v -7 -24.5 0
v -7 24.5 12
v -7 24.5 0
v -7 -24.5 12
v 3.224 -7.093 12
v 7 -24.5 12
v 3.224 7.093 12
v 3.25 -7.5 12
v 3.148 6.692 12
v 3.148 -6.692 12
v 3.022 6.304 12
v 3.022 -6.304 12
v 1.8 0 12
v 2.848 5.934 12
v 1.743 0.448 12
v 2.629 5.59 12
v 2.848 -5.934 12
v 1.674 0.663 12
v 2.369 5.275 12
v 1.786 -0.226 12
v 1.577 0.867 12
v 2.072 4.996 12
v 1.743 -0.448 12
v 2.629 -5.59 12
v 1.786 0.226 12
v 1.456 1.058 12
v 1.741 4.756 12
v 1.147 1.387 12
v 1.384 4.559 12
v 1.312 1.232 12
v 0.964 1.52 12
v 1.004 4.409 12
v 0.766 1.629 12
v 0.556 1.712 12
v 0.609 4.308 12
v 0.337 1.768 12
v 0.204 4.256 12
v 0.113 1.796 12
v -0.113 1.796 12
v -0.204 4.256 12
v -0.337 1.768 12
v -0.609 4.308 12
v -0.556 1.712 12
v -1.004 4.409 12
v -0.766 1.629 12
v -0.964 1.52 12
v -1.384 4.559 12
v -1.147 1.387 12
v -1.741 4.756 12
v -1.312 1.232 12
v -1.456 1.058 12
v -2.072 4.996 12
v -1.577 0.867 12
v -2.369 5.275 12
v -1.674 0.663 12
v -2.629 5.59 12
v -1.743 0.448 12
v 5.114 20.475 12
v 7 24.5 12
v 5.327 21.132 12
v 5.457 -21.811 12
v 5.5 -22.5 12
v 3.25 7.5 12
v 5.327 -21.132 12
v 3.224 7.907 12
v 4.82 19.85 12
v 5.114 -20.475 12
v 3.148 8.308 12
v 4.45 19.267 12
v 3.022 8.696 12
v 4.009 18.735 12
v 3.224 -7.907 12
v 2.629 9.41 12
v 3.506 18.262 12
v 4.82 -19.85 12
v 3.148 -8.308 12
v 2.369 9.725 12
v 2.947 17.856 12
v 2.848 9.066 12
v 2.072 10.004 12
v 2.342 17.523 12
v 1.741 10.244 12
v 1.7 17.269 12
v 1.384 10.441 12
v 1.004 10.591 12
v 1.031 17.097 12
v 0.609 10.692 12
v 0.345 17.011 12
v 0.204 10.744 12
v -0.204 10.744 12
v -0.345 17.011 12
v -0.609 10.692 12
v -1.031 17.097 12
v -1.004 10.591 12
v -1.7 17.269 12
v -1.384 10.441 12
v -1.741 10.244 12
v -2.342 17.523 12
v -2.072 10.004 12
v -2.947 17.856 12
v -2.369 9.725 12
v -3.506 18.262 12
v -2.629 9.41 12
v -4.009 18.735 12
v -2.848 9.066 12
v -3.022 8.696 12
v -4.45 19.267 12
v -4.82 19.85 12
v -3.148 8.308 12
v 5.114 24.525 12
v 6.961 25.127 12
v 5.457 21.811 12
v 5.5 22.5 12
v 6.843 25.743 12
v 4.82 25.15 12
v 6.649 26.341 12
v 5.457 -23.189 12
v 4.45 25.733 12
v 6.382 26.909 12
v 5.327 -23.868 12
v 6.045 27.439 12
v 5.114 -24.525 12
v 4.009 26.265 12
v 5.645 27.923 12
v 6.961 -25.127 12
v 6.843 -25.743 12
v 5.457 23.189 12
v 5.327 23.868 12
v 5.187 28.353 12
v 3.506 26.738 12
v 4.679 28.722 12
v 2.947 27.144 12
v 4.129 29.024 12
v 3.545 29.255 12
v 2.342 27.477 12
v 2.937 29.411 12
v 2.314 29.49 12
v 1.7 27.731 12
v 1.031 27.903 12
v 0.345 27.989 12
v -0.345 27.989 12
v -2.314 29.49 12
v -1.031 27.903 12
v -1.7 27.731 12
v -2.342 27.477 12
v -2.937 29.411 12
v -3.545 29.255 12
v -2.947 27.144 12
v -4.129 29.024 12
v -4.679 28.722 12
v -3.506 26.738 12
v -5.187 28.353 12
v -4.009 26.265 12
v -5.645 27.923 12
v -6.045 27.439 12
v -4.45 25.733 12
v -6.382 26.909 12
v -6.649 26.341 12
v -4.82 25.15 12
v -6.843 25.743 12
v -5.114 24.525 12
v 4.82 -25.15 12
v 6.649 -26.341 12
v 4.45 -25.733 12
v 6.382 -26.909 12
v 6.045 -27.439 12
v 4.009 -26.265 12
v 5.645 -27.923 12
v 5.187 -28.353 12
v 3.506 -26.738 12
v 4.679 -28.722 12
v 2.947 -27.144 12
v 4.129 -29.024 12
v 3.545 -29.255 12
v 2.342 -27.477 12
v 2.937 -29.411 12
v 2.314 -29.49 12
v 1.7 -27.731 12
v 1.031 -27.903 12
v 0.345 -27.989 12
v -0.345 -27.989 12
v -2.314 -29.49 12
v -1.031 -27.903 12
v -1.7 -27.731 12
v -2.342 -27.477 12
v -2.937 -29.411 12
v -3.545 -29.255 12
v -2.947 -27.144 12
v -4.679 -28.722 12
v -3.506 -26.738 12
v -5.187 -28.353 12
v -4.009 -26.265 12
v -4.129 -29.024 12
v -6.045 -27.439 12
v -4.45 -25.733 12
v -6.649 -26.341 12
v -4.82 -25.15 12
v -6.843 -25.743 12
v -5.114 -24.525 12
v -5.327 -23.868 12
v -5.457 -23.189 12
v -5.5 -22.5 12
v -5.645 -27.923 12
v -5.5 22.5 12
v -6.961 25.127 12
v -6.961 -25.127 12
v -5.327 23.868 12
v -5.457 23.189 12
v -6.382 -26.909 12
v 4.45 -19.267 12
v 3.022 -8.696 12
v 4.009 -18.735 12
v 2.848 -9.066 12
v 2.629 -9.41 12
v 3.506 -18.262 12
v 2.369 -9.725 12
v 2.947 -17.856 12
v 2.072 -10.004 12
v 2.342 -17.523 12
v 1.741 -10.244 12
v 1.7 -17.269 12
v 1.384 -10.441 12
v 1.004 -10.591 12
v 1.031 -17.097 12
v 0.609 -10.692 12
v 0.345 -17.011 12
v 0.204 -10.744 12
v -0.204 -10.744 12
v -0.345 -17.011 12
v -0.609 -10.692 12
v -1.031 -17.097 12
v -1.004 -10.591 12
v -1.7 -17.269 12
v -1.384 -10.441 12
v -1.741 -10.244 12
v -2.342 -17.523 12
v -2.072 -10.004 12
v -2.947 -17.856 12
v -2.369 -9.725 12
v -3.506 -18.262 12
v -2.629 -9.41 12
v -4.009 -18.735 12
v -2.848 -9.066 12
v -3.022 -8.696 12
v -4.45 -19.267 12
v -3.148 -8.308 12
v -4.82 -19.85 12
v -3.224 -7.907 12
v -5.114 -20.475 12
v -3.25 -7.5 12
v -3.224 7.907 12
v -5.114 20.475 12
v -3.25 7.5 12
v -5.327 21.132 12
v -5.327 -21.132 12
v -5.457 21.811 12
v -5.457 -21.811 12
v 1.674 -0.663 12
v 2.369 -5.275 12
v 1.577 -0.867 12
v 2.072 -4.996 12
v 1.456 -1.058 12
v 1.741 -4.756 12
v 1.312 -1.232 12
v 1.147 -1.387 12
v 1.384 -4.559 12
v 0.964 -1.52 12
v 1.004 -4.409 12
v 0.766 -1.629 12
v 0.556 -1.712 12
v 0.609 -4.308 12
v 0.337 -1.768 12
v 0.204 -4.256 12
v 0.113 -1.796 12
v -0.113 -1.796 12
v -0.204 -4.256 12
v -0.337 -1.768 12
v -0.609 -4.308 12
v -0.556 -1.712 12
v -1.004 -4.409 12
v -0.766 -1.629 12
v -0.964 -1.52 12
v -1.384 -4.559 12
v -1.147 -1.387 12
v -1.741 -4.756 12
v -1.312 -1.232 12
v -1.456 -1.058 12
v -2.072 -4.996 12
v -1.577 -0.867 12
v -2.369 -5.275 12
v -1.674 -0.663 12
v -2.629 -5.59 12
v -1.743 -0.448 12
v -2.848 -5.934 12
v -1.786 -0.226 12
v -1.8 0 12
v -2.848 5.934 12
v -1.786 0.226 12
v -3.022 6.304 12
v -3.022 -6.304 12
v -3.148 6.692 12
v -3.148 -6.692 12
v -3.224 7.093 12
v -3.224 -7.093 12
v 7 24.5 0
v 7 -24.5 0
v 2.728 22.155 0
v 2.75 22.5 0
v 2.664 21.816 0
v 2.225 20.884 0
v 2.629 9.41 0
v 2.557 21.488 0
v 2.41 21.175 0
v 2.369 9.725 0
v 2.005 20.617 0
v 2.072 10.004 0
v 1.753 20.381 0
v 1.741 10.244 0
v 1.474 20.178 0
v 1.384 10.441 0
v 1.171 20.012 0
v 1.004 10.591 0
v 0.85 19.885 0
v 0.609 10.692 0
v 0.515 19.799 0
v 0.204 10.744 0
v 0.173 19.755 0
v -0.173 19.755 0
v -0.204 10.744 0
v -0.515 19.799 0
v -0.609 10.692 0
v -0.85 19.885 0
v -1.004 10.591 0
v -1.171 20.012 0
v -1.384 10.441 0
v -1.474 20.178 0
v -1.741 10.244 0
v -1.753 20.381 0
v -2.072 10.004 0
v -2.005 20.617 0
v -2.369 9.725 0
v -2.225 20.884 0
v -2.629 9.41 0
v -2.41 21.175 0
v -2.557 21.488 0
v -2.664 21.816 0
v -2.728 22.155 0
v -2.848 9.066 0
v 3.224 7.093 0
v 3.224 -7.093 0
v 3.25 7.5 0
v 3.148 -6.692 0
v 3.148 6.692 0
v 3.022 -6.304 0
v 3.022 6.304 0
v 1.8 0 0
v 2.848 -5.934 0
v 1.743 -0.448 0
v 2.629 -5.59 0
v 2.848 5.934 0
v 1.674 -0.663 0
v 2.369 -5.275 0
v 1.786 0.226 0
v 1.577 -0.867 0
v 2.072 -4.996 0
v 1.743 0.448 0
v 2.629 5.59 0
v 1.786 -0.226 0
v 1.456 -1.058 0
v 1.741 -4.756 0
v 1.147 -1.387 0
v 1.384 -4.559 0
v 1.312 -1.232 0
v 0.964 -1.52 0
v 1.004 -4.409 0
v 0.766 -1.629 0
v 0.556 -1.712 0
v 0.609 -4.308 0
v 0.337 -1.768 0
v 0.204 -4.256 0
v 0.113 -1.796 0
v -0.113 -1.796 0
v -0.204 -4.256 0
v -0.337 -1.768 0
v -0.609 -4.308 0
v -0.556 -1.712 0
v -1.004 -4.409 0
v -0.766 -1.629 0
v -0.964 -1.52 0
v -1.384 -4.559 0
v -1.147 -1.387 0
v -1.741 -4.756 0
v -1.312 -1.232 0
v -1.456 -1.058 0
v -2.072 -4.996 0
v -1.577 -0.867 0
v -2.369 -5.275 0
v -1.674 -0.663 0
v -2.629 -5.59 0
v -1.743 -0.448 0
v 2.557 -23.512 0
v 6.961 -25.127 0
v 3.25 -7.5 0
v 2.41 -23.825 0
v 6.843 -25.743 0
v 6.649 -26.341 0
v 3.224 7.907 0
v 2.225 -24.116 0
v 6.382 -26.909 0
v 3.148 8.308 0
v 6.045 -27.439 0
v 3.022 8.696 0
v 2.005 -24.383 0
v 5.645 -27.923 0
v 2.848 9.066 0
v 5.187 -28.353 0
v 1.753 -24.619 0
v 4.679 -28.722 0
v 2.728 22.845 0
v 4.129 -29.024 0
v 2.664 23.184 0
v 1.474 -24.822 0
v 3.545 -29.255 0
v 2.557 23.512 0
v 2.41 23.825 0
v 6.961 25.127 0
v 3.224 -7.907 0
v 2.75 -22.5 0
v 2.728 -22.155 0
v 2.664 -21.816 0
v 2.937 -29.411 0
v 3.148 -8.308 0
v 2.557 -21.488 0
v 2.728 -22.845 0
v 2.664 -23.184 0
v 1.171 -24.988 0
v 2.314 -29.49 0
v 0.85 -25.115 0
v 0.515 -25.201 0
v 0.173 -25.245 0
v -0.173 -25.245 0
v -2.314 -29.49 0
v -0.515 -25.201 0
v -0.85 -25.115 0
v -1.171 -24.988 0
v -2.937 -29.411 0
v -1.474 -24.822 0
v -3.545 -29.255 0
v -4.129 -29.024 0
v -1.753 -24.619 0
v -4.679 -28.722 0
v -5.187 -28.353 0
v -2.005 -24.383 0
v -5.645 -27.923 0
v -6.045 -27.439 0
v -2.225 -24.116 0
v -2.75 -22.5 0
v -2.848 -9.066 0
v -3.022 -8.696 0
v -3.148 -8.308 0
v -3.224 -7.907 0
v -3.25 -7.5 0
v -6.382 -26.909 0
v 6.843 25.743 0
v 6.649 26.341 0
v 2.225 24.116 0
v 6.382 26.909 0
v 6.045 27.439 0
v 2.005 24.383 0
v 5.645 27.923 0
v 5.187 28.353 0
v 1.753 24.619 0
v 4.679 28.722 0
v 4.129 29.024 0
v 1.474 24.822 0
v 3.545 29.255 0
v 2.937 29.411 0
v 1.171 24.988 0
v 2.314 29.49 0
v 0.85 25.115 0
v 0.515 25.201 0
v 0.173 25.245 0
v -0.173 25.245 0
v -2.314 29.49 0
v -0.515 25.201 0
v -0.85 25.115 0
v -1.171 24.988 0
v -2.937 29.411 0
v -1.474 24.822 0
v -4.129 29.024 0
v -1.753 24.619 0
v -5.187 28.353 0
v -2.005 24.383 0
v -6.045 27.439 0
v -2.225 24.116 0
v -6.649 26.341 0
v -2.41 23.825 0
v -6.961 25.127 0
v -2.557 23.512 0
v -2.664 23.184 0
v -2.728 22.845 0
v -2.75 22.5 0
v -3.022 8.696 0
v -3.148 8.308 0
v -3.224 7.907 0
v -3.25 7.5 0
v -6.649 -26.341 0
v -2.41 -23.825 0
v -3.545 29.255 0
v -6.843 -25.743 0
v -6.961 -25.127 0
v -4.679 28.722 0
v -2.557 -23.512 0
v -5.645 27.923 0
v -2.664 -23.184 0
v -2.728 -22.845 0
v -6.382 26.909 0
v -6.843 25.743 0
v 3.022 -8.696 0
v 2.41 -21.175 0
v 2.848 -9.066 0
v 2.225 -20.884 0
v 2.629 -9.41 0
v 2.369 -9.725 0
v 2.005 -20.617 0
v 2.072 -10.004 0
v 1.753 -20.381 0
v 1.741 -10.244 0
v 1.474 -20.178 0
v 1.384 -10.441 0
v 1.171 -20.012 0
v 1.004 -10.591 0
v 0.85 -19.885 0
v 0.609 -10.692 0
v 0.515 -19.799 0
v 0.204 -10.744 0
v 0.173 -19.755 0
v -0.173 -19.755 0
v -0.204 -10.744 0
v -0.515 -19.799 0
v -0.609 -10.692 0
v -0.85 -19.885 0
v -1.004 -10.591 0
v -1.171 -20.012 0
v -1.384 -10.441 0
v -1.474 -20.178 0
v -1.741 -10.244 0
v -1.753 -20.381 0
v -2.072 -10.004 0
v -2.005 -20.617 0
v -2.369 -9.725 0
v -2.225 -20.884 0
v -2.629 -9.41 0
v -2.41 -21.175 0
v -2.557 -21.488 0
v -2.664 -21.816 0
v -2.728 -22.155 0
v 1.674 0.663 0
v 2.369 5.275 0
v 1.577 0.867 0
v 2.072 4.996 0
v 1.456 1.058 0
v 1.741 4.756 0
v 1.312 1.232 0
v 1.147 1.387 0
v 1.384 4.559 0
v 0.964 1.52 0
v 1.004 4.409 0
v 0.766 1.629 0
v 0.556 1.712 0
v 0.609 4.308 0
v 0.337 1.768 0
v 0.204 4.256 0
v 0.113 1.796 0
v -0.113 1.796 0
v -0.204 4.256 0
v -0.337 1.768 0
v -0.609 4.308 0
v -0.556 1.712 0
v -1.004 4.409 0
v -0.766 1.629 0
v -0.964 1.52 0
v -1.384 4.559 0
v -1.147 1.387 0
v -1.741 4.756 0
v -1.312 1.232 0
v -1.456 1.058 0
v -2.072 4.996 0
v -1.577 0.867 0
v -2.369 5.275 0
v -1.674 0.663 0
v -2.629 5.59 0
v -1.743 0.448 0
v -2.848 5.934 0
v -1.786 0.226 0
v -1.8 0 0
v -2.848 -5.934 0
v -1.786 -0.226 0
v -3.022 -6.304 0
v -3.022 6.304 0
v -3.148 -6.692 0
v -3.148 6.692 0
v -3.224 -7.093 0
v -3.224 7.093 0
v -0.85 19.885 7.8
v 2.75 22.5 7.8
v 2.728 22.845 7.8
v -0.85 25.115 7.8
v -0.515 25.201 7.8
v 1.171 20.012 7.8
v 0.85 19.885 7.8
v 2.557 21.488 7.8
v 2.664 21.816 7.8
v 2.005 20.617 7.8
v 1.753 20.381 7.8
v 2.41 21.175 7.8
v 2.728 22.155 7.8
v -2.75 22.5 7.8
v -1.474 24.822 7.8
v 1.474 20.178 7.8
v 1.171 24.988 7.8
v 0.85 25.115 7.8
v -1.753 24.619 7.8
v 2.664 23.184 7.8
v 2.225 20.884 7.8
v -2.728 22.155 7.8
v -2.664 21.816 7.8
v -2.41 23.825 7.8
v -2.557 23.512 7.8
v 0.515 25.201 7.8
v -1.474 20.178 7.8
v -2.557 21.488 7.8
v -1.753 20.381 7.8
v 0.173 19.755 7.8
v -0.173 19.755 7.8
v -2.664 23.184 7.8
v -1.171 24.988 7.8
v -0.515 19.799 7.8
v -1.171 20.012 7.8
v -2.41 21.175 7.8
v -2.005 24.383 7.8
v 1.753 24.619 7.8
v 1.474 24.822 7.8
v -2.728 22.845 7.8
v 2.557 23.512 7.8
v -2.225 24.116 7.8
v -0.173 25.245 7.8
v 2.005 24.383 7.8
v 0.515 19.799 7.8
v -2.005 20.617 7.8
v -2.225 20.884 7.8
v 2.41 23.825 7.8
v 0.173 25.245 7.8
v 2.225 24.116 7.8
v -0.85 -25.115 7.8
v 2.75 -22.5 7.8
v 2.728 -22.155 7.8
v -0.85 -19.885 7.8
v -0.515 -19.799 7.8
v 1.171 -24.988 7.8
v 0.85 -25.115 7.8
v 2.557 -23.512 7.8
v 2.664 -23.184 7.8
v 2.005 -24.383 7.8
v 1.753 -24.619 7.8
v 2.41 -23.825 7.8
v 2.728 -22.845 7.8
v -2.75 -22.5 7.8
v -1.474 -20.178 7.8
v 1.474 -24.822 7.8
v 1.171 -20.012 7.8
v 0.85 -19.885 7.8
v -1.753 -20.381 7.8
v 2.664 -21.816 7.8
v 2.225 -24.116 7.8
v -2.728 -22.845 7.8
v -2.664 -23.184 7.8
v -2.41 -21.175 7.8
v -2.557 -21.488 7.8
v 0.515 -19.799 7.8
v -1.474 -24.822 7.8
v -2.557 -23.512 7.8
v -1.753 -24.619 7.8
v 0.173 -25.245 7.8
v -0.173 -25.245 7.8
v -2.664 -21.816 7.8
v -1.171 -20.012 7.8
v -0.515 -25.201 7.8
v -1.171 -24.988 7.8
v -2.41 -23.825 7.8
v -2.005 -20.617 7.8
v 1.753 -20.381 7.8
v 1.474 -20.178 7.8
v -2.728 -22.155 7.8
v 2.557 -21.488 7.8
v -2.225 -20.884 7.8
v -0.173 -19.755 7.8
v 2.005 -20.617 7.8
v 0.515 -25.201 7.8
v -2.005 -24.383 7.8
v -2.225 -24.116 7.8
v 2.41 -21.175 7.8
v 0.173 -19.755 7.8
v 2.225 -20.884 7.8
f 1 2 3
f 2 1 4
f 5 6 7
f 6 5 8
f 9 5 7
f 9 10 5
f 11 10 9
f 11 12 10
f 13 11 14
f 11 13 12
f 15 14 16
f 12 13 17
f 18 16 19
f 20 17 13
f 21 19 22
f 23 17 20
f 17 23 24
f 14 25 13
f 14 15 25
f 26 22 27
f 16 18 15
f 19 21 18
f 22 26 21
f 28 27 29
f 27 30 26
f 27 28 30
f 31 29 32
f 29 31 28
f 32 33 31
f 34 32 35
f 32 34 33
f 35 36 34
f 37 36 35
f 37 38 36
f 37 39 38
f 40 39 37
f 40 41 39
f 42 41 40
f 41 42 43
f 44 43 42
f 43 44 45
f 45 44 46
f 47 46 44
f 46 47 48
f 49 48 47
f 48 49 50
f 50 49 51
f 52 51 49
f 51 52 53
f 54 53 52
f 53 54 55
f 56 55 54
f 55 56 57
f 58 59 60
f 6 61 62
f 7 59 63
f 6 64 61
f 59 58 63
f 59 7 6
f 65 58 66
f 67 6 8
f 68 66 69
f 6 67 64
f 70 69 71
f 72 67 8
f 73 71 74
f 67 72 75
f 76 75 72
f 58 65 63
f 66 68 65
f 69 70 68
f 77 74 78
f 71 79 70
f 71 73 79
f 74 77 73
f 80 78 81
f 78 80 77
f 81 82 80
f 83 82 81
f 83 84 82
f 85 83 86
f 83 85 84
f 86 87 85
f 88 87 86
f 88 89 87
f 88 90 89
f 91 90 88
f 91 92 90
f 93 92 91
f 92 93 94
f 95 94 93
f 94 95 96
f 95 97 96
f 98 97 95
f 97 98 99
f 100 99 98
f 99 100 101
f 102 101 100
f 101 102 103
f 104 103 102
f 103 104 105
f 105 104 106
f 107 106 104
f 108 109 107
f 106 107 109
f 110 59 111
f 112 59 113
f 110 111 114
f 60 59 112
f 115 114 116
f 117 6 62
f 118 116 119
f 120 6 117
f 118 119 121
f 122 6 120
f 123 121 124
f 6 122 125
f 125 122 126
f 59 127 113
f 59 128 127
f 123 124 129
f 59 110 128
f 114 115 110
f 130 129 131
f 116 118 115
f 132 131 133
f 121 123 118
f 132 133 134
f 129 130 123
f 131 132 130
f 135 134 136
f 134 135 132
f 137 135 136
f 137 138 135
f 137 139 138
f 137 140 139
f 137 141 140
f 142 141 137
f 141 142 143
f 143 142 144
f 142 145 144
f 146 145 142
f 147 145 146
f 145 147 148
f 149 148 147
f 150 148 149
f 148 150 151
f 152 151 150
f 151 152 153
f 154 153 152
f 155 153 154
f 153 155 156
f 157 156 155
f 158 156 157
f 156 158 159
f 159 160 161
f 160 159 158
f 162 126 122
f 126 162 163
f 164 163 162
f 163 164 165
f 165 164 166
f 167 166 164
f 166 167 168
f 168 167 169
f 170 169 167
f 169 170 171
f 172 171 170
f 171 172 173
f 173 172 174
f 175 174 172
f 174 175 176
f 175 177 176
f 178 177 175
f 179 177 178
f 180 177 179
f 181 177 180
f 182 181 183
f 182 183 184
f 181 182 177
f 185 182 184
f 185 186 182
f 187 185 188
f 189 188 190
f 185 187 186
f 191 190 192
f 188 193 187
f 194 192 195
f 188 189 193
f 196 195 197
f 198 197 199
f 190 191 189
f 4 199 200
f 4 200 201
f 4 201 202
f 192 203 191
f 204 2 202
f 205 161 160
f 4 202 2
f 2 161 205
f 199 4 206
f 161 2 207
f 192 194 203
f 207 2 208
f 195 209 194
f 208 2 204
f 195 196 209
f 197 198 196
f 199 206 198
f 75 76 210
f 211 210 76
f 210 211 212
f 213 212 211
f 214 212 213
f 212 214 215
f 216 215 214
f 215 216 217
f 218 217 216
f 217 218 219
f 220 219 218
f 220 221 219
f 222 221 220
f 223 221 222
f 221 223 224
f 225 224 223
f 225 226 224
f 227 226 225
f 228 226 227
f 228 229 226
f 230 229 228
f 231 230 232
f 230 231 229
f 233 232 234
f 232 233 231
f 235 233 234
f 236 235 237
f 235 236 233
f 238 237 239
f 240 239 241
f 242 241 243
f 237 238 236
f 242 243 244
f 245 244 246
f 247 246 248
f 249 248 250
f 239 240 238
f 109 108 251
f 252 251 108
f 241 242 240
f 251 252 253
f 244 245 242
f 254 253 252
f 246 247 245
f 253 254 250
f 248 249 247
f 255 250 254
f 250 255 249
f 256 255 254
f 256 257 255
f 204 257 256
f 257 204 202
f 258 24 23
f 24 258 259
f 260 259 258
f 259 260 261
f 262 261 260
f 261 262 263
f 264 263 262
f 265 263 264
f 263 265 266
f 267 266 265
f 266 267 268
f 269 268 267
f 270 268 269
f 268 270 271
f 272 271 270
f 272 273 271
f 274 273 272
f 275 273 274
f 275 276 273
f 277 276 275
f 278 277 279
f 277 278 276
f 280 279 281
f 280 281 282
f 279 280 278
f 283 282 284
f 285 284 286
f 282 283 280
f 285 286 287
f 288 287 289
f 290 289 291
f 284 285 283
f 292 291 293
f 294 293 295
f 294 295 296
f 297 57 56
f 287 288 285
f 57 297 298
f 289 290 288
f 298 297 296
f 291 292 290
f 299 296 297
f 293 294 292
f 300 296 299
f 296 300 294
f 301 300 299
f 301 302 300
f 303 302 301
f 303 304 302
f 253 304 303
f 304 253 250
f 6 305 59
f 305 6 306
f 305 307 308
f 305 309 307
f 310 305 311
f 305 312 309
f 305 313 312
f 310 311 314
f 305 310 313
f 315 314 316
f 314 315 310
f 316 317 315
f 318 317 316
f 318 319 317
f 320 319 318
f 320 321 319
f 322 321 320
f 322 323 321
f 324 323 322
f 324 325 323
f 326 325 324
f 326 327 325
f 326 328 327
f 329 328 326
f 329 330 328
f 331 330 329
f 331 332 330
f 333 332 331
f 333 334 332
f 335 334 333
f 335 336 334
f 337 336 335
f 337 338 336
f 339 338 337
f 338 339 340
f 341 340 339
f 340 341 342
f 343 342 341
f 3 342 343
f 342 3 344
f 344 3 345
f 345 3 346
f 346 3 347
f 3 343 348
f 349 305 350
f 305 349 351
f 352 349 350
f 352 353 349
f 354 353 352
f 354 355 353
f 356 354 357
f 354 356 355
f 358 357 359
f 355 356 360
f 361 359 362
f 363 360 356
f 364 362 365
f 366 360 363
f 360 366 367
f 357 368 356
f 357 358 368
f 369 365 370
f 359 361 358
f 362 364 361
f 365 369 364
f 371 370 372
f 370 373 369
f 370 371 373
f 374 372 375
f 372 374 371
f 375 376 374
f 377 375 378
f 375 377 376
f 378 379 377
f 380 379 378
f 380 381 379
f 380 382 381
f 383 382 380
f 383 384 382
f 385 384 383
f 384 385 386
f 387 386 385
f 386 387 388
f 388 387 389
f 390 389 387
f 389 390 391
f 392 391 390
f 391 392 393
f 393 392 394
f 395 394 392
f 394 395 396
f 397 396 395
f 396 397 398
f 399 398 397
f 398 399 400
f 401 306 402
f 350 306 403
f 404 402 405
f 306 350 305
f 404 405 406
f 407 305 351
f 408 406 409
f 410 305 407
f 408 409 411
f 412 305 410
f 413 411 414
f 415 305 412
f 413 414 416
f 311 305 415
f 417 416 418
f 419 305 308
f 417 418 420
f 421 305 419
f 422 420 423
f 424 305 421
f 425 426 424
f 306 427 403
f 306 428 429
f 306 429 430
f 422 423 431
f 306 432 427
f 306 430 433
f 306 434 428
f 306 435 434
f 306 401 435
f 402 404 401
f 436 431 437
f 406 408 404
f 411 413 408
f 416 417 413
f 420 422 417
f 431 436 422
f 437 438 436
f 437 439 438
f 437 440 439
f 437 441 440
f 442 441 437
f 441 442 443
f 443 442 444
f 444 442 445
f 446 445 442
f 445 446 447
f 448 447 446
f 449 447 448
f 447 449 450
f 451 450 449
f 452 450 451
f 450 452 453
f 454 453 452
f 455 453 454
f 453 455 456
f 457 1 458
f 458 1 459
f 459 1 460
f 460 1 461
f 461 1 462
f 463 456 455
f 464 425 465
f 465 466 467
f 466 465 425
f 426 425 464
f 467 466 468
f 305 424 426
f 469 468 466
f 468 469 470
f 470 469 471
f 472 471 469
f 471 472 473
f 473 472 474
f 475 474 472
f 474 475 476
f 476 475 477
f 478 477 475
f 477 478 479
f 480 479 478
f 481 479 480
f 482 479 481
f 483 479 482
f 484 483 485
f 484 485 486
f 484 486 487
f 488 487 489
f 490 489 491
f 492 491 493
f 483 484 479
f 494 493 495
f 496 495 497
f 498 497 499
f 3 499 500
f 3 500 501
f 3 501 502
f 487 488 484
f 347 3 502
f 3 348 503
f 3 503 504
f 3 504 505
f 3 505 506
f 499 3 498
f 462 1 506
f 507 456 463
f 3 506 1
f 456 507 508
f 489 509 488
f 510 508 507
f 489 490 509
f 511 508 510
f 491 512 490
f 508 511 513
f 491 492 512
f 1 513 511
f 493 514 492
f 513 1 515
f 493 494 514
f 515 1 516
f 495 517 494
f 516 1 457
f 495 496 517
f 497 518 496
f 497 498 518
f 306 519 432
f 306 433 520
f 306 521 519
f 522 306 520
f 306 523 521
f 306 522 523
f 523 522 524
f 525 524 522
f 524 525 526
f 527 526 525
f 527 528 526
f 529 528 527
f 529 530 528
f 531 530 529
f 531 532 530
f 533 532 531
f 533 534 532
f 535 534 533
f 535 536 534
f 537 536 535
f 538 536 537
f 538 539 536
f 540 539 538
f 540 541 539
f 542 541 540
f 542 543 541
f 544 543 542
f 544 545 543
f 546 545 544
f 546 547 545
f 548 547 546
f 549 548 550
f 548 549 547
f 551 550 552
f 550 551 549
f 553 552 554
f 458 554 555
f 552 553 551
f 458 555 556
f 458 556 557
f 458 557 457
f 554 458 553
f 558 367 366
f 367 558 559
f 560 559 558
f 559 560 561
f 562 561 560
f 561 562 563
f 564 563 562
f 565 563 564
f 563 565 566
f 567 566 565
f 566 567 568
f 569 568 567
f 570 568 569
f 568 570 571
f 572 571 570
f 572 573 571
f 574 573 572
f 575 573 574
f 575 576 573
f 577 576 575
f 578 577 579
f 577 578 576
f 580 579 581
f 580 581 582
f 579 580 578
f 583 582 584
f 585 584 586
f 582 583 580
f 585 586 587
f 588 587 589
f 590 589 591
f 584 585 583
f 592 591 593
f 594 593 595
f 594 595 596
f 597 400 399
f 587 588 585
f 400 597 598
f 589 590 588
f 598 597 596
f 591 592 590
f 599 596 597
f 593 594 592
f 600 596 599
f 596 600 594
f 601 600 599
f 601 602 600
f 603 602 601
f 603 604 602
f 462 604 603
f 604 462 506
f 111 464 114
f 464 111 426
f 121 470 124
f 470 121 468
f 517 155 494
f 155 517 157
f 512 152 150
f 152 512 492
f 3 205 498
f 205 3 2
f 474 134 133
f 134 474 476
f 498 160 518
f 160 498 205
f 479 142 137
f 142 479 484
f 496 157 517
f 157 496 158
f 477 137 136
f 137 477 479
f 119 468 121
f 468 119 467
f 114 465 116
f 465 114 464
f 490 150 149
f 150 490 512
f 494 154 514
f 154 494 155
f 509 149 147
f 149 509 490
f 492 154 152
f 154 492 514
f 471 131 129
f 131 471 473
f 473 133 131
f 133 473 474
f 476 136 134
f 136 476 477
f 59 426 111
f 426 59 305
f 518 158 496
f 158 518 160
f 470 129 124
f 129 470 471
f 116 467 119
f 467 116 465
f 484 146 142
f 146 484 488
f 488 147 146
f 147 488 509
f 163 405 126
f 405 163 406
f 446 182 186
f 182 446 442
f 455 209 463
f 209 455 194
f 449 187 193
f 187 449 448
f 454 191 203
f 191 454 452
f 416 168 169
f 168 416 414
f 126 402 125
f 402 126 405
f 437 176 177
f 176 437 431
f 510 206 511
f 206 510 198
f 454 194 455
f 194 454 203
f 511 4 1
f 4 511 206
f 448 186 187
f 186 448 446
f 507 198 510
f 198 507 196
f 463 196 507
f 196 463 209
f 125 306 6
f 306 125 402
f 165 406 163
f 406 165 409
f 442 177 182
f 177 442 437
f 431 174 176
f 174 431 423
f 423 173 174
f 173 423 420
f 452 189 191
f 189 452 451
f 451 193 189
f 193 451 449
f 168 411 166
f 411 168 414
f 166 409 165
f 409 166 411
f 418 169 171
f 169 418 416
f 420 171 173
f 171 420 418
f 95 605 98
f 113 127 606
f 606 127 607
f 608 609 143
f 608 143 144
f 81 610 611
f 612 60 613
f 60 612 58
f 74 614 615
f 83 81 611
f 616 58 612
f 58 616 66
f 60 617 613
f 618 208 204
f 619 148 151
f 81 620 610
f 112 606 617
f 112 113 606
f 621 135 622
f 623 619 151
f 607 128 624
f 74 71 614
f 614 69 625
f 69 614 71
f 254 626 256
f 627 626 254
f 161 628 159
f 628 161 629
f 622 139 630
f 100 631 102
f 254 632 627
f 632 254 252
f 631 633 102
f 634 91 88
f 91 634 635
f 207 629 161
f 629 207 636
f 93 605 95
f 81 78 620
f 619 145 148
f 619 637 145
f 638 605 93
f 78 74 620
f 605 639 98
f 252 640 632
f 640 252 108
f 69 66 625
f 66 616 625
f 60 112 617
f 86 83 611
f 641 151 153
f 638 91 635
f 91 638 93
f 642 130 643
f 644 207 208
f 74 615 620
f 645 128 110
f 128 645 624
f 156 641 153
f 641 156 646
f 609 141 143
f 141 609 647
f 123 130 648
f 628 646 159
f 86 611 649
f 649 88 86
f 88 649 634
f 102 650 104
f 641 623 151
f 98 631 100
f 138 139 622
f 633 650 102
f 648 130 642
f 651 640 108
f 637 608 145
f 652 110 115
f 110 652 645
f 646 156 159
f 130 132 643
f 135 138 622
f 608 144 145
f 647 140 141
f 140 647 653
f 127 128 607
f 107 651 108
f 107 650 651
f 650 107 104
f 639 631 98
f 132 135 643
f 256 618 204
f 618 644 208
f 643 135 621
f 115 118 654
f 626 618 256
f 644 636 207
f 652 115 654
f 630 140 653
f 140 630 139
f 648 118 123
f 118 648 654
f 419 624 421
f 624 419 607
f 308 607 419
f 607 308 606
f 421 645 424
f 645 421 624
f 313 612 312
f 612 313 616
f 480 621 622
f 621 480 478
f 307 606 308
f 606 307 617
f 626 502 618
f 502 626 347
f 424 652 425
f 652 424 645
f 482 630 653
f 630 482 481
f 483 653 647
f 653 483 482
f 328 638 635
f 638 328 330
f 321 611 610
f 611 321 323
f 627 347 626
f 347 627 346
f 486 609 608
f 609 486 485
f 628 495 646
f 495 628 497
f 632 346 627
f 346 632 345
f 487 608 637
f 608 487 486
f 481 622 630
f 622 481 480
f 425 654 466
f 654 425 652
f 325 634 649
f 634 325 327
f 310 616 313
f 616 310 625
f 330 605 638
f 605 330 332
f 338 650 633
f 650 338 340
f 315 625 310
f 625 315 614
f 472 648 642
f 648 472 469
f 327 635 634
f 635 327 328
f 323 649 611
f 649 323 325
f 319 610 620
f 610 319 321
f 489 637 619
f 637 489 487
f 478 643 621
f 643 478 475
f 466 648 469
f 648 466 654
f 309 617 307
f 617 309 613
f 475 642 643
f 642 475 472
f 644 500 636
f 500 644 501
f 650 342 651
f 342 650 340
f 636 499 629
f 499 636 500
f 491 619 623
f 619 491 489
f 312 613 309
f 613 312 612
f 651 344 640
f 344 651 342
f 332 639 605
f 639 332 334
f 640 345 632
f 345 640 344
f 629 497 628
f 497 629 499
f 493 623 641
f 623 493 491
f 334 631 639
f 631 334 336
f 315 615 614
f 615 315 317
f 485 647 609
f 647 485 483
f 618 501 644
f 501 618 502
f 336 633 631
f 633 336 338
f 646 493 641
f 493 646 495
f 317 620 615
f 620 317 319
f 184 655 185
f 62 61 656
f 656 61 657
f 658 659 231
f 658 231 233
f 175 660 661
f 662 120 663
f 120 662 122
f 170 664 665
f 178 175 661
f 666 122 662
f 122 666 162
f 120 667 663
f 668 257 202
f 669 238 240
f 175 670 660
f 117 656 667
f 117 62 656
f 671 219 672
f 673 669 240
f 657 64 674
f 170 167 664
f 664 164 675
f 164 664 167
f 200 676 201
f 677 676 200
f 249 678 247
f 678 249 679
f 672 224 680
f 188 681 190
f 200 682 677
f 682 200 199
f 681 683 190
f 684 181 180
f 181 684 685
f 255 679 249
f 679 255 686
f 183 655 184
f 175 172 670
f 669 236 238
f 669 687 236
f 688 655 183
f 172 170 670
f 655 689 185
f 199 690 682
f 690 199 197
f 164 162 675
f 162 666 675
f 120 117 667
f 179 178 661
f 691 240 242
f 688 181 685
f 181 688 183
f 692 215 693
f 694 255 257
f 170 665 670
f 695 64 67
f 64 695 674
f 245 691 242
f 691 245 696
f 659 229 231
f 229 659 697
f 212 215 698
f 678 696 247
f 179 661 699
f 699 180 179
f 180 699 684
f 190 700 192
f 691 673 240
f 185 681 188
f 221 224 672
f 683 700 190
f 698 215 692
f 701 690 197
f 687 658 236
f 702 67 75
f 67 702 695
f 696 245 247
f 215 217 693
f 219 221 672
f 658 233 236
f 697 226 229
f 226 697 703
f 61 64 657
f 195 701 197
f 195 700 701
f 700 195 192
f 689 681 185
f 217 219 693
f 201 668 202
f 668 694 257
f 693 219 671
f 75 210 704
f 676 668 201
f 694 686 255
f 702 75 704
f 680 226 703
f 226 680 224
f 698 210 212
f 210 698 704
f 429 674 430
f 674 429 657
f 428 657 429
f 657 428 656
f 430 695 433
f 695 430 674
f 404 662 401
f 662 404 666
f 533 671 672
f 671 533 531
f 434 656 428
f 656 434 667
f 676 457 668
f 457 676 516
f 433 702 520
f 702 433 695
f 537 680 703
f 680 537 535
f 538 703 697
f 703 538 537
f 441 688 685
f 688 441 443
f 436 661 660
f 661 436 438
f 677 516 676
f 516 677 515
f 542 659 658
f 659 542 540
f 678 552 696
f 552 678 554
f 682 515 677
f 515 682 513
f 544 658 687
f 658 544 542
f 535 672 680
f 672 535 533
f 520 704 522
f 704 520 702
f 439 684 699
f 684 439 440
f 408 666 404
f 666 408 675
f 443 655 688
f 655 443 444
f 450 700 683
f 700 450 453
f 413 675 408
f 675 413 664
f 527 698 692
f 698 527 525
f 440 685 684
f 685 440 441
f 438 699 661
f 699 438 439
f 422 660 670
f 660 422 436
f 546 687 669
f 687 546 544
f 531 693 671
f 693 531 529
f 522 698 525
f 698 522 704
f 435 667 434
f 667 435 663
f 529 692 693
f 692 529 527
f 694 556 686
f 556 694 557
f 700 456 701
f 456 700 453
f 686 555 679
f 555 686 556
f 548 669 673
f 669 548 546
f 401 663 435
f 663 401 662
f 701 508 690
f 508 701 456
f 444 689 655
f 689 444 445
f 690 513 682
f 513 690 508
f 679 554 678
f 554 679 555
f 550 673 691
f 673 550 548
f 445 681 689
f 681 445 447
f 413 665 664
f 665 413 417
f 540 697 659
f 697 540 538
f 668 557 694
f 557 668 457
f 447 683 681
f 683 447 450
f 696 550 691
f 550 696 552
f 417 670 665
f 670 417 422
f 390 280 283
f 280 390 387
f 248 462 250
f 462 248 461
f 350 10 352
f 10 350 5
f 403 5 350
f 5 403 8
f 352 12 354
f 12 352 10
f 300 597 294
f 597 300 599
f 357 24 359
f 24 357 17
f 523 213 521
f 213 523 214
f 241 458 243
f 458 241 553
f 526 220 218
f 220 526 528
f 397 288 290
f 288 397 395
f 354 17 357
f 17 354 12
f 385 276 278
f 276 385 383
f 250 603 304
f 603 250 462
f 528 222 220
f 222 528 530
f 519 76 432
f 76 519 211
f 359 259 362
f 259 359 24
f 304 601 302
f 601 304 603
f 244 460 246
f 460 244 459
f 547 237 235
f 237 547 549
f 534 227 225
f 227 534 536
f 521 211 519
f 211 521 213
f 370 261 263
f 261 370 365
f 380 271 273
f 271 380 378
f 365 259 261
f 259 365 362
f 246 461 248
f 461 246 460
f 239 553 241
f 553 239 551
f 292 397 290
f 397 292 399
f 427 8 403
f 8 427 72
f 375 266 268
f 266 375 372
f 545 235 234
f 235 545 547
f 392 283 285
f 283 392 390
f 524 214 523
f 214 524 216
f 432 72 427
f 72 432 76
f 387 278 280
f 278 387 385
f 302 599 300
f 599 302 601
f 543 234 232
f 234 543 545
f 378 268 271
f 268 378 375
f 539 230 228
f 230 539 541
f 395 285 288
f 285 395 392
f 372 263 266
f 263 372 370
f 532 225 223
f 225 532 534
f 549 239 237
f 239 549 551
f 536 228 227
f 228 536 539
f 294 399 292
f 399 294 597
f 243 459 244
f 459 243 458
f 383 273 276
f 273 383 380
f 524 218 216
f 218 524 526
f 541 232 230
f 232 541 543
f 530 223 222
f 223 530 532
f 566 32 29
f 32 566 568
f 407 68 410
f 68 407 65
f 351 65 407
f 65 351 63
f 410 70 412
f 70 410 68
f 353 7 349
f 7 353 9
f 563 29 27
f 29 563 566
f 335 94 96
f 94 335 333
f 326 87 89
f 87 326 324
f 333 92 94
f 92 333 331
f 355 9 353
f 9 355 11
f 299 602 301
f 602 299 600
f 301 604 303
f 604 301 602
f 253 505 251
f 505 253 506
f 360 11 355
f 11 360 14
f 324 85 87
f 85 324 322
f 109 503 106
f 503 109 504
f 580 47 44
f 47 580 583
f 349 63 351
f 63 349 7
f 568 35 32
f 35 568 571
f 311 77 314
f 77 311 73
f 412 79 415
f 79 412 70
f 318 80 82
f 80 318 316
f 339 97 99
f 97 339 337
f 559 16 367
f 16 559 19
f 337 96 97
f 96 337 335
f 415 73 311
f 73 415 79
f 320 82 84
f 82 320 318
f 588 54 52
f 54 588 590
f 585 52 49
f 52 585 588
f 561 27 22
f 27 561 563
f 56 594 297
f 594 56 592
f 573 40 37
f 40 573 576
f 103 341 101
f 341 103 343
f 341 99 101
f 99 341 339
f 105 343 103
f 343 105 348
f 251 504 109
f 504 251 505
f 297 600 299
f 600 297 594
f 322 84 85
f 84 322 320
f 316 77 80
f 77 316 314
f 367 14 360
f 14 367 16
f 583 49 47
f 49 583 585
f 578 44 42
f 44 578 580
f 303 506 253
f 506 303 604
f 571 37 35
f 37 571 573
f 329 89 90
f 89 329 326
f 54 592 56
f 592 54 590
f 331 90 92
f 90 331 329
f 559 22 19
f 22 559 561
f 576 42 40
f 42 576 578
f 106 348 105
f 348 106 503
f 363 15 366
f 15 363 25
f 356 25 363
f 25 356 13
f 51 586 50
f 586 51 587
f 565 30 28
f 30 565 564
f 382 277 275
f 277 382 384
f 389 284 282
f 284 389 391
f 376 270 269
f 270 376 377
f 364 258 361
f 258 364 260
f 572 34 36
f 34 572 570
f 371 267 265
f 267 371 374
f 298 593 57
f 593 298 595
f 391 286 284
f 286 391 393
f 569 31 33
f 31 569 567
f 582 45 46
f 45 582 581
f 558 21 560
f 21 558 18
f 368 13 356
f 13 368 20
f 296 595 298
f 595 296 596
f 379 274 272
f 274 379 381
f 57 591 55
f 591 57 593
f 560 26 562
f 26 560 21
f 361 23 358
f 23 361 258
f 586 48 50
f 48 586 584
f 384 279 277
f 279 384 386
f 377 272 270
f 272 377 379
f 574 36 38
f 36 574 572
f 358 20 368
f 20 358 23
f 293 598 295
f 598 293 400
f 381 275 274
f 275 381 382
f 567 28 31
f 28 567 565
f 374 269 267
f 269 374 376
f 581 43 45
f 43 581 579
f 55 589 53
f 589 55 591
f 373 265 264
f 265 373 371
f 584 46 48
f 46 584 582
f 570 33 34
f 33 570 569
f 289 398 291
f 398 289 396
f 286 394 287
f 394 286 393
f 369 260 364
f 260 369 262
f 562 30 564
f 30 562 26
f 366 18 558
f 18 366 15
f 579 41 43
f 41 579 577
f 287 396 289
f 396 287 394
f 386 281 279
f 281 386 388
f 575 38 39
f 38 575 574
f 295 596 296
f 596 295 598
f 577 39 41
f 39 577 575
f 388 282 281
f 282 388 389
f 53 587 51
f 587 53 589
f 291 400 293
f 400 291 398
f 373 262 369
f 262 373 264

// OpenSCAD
$fn = 50;


difference() {
	union() {
		hull() {
			translate(v = [-2.0000000000, 9.5000000000, 0]) {
				cylinder(h = 12, r = 5);
			}
			translate(v = [2.0000000000, 9.5000000000, 0]) {
				cylinder(h = 12, r = 5);
			}
			translate(v = [-2.0000000000, -9.5000000000, 0]) {
				cylinder(h = 12, r = 5);
			}
			translate(v = [2.0000000000, -9.5000000000, 0]) {
				cylinder(h = 12, r = 5);
			}
		}
		translate(v = [0.0000000000, 15.0000000000, 0]) {
			hull() {
				translate(v = [-2.0000000000, 9.5000000000, 0]) {
					cylinder(h = 12, r = 5);
				}
				translate(v = [2.0000000000, 9.5000000000, 0]) {
					cylinder(h = 12, r = 5);
				}
				translate(v = [-2.0000000000, -9.5000000000, 0]) {
					cylinder(h = 12, r = 5);
				}
				translate(v = [2.0000000000, -9.5000000000, 0]) {
					cylinder(h = 12, r = 5);
				}
			}
		}
		translate(v = [0.0000000000, 15.0000000000, 0]) {
			hull() {
				translate(v = [-2.0000000000, 9.5000000000, 0]) {
					cylinder(h = 12, r = 5);
				}
				translate(v = [2.0000000000, 9.5000000000, 0]) {
					cylinder(h = 12, r = 5);
				}
				translate(v = [-2.0000000000, -9.5000000000, 0]) {
					cylinder(h = 12, r = 5);
				}
				translate(v = [2.0000000000, -9.5000000000, 0]) {
					cylinder(h = 12, r = 5);
				}
			}
		}
		translate(v = [0.0000000000, -15.0000000000, 0]) {
			hull() {
				translate(v = [-2.0000000000, 9.5000000000, 0]) {
					cylinder(h = 12, r = 5);
				}
				translate(v = [2.0000000000, 9.5000000000, 0]) {
					cylinder(h = 12, r = 5);
				}
				translate(v = [-2.0000000000, -9.5000000000, 0]) {
					cylinder(h = 12, r = 5);
				}
				translate(v = [2.0000000000, -9.5000000000, 0]) {
					cylinder(h = 12, r = 5);
				}
			}
		}
		translate(v = [0.0000000000, -15.0000000000, 0]) {
			hull() {
				translate(v = [-2.0000000000, 9.5000000000, 0]) {
					cylinder(h = 12, r = 5);
				}
				translate(v = [2.0000000000, 9.5000000000, 0]) {
					cylinder(h = 12, r = 5);
				}
				translate(v = [-2.0000000000, -9.5000000000, 0]) {
					cylinder(h = 12, r = 5);
				}
				translate(v = [2.0000000000, -9.5000000000, 0]) {
					cylinder(h = 12, r = 5);
				}
			}
		}
	}
	union() {
		translate(v = [0.0000000000, 22.5000000000, 12]) {
			rotate(a = [0, 0, 0]) {
				difference() {
					union() {
						#translate(v = [0, 0, -12.0000000000]) {
							cylinder(h = 12, r = 2.2500000000);
						}
						#translate(v = [0, 0, -4.2000000000]) {
							cylinder(h = 4.2000000000, r1 = 2.7500000000, r2 = 5.5000000000);
						}
						#translate(v = [0, 0, -12.0000000000]) {
							cylinder(h = 12, r = 2.7500000000);
						}
						#translate(v = [0, 0, -12.0000000000]) {
							cylinder(h = 12, r = 2.2500000000);
						}
					}
					union();
				}
			}
		}
		translate(v = [0.0000000000, 22.5000000000, 12]) {
			rotate(a = [0, 0, 0]) {
				difference() {
					union() {
						#translate(v = [0, 0, -12.0000000000]) {
							cylinder(h = 12, r = 2.2500000000);
						}
						#translate(v = [0, 0, -4.2000000000]) {
							cylinder(h = 4.2000000000, r1 = 2.7500000000, r2 = 5.5000000000);
						}
						#translate(v = [0, 0, -12.0000000000]) {
							cylinder(h = 12, r = 2.7500000000);
						}
						#translate(v = [0, 0, -12.0000000000]) {
							cylinder(h = 12, r = 2.2500000000);
						}
					}
					union();
				}
			}
		}
		translate(v = [0.0000000000, -22.5000000000, 12]) {
			rotate(a = [0, 0, 0]) {
				difference() {
					union() {
						#translate(v = [0, 0, -12.0000000000]) {
							cylinder(h = 12, r = 2.2500000000);
						}
						#translate(v = [0, 0, -4.2000000000]) {
							cylinder(h = 4.2000000000, r1 = 2.7500000000, r2 = 5.5000000000);
						}
						#translate(v = [0, 0, -12.0000000000]) {
							cylinder(h = 12, r = 2.7500000000);
						}
						#translate(v = [0, 0, -12.0000000000]) {
							cylinder(h = 12, r = 2.2500000000);
						}
					}
					union();
				}
			}
		}
		translate(v = [0.0000000000, -22.5000000000, 12]) {
			rotate(a = [0, 0, 0]) {
				difference() {
					union() {
						#translate(v = [0, 0, -12.0000000000]) {
							cylinder(h = 12, r = 2.2500000000);
						}
						#translate(v = [0, 0, -4.2000000000]) {
							cylinder(h = 4.2000000000, r1 = 2.7500000000, r2 = 5.5000000000);
						}
						#translate(v = [0, 0, -12.0000000000]) {
							cylinder(h = 12, r = 2.7500000000);
						}
						#translate(v = [0, 0, -12.0000000000]) {
							cylinder(h = 12, r = 2.2500000000);
						}
					}
					union();
				}
			}
		}
		translate(v = [0.0000000000, -7.5000000000, 0]) {
			translate(v = [0, 0, -100]) {
				cylinder(h = 200, r = 3.2500000000);
			}
		}
		translate(v = [0.0000000000, 7.5000000000, 0]) {
			translate(v = [0, 0, -100]) {
				cylinder(h = 200, r = 3.2500000000);
			}
		}
		translate(v = [0.0000000000, -7.5000000000, 0]) {
			translate(v = [0, 0, -100]) {
				cylinder(h = 200, r = 1.8000000000);
			}
		}
		translate(v = [0, 0, -100]) {
			cylinder(h = 200, r = 1.8000000000);
		}
		translate(v = [0.0000000000, 7.5000000000, 0]) {
			translate(v = [0, 0, -100]) {
				cylinder(h = 200, r = 1.8000000000);
			}
		}
	}
}
